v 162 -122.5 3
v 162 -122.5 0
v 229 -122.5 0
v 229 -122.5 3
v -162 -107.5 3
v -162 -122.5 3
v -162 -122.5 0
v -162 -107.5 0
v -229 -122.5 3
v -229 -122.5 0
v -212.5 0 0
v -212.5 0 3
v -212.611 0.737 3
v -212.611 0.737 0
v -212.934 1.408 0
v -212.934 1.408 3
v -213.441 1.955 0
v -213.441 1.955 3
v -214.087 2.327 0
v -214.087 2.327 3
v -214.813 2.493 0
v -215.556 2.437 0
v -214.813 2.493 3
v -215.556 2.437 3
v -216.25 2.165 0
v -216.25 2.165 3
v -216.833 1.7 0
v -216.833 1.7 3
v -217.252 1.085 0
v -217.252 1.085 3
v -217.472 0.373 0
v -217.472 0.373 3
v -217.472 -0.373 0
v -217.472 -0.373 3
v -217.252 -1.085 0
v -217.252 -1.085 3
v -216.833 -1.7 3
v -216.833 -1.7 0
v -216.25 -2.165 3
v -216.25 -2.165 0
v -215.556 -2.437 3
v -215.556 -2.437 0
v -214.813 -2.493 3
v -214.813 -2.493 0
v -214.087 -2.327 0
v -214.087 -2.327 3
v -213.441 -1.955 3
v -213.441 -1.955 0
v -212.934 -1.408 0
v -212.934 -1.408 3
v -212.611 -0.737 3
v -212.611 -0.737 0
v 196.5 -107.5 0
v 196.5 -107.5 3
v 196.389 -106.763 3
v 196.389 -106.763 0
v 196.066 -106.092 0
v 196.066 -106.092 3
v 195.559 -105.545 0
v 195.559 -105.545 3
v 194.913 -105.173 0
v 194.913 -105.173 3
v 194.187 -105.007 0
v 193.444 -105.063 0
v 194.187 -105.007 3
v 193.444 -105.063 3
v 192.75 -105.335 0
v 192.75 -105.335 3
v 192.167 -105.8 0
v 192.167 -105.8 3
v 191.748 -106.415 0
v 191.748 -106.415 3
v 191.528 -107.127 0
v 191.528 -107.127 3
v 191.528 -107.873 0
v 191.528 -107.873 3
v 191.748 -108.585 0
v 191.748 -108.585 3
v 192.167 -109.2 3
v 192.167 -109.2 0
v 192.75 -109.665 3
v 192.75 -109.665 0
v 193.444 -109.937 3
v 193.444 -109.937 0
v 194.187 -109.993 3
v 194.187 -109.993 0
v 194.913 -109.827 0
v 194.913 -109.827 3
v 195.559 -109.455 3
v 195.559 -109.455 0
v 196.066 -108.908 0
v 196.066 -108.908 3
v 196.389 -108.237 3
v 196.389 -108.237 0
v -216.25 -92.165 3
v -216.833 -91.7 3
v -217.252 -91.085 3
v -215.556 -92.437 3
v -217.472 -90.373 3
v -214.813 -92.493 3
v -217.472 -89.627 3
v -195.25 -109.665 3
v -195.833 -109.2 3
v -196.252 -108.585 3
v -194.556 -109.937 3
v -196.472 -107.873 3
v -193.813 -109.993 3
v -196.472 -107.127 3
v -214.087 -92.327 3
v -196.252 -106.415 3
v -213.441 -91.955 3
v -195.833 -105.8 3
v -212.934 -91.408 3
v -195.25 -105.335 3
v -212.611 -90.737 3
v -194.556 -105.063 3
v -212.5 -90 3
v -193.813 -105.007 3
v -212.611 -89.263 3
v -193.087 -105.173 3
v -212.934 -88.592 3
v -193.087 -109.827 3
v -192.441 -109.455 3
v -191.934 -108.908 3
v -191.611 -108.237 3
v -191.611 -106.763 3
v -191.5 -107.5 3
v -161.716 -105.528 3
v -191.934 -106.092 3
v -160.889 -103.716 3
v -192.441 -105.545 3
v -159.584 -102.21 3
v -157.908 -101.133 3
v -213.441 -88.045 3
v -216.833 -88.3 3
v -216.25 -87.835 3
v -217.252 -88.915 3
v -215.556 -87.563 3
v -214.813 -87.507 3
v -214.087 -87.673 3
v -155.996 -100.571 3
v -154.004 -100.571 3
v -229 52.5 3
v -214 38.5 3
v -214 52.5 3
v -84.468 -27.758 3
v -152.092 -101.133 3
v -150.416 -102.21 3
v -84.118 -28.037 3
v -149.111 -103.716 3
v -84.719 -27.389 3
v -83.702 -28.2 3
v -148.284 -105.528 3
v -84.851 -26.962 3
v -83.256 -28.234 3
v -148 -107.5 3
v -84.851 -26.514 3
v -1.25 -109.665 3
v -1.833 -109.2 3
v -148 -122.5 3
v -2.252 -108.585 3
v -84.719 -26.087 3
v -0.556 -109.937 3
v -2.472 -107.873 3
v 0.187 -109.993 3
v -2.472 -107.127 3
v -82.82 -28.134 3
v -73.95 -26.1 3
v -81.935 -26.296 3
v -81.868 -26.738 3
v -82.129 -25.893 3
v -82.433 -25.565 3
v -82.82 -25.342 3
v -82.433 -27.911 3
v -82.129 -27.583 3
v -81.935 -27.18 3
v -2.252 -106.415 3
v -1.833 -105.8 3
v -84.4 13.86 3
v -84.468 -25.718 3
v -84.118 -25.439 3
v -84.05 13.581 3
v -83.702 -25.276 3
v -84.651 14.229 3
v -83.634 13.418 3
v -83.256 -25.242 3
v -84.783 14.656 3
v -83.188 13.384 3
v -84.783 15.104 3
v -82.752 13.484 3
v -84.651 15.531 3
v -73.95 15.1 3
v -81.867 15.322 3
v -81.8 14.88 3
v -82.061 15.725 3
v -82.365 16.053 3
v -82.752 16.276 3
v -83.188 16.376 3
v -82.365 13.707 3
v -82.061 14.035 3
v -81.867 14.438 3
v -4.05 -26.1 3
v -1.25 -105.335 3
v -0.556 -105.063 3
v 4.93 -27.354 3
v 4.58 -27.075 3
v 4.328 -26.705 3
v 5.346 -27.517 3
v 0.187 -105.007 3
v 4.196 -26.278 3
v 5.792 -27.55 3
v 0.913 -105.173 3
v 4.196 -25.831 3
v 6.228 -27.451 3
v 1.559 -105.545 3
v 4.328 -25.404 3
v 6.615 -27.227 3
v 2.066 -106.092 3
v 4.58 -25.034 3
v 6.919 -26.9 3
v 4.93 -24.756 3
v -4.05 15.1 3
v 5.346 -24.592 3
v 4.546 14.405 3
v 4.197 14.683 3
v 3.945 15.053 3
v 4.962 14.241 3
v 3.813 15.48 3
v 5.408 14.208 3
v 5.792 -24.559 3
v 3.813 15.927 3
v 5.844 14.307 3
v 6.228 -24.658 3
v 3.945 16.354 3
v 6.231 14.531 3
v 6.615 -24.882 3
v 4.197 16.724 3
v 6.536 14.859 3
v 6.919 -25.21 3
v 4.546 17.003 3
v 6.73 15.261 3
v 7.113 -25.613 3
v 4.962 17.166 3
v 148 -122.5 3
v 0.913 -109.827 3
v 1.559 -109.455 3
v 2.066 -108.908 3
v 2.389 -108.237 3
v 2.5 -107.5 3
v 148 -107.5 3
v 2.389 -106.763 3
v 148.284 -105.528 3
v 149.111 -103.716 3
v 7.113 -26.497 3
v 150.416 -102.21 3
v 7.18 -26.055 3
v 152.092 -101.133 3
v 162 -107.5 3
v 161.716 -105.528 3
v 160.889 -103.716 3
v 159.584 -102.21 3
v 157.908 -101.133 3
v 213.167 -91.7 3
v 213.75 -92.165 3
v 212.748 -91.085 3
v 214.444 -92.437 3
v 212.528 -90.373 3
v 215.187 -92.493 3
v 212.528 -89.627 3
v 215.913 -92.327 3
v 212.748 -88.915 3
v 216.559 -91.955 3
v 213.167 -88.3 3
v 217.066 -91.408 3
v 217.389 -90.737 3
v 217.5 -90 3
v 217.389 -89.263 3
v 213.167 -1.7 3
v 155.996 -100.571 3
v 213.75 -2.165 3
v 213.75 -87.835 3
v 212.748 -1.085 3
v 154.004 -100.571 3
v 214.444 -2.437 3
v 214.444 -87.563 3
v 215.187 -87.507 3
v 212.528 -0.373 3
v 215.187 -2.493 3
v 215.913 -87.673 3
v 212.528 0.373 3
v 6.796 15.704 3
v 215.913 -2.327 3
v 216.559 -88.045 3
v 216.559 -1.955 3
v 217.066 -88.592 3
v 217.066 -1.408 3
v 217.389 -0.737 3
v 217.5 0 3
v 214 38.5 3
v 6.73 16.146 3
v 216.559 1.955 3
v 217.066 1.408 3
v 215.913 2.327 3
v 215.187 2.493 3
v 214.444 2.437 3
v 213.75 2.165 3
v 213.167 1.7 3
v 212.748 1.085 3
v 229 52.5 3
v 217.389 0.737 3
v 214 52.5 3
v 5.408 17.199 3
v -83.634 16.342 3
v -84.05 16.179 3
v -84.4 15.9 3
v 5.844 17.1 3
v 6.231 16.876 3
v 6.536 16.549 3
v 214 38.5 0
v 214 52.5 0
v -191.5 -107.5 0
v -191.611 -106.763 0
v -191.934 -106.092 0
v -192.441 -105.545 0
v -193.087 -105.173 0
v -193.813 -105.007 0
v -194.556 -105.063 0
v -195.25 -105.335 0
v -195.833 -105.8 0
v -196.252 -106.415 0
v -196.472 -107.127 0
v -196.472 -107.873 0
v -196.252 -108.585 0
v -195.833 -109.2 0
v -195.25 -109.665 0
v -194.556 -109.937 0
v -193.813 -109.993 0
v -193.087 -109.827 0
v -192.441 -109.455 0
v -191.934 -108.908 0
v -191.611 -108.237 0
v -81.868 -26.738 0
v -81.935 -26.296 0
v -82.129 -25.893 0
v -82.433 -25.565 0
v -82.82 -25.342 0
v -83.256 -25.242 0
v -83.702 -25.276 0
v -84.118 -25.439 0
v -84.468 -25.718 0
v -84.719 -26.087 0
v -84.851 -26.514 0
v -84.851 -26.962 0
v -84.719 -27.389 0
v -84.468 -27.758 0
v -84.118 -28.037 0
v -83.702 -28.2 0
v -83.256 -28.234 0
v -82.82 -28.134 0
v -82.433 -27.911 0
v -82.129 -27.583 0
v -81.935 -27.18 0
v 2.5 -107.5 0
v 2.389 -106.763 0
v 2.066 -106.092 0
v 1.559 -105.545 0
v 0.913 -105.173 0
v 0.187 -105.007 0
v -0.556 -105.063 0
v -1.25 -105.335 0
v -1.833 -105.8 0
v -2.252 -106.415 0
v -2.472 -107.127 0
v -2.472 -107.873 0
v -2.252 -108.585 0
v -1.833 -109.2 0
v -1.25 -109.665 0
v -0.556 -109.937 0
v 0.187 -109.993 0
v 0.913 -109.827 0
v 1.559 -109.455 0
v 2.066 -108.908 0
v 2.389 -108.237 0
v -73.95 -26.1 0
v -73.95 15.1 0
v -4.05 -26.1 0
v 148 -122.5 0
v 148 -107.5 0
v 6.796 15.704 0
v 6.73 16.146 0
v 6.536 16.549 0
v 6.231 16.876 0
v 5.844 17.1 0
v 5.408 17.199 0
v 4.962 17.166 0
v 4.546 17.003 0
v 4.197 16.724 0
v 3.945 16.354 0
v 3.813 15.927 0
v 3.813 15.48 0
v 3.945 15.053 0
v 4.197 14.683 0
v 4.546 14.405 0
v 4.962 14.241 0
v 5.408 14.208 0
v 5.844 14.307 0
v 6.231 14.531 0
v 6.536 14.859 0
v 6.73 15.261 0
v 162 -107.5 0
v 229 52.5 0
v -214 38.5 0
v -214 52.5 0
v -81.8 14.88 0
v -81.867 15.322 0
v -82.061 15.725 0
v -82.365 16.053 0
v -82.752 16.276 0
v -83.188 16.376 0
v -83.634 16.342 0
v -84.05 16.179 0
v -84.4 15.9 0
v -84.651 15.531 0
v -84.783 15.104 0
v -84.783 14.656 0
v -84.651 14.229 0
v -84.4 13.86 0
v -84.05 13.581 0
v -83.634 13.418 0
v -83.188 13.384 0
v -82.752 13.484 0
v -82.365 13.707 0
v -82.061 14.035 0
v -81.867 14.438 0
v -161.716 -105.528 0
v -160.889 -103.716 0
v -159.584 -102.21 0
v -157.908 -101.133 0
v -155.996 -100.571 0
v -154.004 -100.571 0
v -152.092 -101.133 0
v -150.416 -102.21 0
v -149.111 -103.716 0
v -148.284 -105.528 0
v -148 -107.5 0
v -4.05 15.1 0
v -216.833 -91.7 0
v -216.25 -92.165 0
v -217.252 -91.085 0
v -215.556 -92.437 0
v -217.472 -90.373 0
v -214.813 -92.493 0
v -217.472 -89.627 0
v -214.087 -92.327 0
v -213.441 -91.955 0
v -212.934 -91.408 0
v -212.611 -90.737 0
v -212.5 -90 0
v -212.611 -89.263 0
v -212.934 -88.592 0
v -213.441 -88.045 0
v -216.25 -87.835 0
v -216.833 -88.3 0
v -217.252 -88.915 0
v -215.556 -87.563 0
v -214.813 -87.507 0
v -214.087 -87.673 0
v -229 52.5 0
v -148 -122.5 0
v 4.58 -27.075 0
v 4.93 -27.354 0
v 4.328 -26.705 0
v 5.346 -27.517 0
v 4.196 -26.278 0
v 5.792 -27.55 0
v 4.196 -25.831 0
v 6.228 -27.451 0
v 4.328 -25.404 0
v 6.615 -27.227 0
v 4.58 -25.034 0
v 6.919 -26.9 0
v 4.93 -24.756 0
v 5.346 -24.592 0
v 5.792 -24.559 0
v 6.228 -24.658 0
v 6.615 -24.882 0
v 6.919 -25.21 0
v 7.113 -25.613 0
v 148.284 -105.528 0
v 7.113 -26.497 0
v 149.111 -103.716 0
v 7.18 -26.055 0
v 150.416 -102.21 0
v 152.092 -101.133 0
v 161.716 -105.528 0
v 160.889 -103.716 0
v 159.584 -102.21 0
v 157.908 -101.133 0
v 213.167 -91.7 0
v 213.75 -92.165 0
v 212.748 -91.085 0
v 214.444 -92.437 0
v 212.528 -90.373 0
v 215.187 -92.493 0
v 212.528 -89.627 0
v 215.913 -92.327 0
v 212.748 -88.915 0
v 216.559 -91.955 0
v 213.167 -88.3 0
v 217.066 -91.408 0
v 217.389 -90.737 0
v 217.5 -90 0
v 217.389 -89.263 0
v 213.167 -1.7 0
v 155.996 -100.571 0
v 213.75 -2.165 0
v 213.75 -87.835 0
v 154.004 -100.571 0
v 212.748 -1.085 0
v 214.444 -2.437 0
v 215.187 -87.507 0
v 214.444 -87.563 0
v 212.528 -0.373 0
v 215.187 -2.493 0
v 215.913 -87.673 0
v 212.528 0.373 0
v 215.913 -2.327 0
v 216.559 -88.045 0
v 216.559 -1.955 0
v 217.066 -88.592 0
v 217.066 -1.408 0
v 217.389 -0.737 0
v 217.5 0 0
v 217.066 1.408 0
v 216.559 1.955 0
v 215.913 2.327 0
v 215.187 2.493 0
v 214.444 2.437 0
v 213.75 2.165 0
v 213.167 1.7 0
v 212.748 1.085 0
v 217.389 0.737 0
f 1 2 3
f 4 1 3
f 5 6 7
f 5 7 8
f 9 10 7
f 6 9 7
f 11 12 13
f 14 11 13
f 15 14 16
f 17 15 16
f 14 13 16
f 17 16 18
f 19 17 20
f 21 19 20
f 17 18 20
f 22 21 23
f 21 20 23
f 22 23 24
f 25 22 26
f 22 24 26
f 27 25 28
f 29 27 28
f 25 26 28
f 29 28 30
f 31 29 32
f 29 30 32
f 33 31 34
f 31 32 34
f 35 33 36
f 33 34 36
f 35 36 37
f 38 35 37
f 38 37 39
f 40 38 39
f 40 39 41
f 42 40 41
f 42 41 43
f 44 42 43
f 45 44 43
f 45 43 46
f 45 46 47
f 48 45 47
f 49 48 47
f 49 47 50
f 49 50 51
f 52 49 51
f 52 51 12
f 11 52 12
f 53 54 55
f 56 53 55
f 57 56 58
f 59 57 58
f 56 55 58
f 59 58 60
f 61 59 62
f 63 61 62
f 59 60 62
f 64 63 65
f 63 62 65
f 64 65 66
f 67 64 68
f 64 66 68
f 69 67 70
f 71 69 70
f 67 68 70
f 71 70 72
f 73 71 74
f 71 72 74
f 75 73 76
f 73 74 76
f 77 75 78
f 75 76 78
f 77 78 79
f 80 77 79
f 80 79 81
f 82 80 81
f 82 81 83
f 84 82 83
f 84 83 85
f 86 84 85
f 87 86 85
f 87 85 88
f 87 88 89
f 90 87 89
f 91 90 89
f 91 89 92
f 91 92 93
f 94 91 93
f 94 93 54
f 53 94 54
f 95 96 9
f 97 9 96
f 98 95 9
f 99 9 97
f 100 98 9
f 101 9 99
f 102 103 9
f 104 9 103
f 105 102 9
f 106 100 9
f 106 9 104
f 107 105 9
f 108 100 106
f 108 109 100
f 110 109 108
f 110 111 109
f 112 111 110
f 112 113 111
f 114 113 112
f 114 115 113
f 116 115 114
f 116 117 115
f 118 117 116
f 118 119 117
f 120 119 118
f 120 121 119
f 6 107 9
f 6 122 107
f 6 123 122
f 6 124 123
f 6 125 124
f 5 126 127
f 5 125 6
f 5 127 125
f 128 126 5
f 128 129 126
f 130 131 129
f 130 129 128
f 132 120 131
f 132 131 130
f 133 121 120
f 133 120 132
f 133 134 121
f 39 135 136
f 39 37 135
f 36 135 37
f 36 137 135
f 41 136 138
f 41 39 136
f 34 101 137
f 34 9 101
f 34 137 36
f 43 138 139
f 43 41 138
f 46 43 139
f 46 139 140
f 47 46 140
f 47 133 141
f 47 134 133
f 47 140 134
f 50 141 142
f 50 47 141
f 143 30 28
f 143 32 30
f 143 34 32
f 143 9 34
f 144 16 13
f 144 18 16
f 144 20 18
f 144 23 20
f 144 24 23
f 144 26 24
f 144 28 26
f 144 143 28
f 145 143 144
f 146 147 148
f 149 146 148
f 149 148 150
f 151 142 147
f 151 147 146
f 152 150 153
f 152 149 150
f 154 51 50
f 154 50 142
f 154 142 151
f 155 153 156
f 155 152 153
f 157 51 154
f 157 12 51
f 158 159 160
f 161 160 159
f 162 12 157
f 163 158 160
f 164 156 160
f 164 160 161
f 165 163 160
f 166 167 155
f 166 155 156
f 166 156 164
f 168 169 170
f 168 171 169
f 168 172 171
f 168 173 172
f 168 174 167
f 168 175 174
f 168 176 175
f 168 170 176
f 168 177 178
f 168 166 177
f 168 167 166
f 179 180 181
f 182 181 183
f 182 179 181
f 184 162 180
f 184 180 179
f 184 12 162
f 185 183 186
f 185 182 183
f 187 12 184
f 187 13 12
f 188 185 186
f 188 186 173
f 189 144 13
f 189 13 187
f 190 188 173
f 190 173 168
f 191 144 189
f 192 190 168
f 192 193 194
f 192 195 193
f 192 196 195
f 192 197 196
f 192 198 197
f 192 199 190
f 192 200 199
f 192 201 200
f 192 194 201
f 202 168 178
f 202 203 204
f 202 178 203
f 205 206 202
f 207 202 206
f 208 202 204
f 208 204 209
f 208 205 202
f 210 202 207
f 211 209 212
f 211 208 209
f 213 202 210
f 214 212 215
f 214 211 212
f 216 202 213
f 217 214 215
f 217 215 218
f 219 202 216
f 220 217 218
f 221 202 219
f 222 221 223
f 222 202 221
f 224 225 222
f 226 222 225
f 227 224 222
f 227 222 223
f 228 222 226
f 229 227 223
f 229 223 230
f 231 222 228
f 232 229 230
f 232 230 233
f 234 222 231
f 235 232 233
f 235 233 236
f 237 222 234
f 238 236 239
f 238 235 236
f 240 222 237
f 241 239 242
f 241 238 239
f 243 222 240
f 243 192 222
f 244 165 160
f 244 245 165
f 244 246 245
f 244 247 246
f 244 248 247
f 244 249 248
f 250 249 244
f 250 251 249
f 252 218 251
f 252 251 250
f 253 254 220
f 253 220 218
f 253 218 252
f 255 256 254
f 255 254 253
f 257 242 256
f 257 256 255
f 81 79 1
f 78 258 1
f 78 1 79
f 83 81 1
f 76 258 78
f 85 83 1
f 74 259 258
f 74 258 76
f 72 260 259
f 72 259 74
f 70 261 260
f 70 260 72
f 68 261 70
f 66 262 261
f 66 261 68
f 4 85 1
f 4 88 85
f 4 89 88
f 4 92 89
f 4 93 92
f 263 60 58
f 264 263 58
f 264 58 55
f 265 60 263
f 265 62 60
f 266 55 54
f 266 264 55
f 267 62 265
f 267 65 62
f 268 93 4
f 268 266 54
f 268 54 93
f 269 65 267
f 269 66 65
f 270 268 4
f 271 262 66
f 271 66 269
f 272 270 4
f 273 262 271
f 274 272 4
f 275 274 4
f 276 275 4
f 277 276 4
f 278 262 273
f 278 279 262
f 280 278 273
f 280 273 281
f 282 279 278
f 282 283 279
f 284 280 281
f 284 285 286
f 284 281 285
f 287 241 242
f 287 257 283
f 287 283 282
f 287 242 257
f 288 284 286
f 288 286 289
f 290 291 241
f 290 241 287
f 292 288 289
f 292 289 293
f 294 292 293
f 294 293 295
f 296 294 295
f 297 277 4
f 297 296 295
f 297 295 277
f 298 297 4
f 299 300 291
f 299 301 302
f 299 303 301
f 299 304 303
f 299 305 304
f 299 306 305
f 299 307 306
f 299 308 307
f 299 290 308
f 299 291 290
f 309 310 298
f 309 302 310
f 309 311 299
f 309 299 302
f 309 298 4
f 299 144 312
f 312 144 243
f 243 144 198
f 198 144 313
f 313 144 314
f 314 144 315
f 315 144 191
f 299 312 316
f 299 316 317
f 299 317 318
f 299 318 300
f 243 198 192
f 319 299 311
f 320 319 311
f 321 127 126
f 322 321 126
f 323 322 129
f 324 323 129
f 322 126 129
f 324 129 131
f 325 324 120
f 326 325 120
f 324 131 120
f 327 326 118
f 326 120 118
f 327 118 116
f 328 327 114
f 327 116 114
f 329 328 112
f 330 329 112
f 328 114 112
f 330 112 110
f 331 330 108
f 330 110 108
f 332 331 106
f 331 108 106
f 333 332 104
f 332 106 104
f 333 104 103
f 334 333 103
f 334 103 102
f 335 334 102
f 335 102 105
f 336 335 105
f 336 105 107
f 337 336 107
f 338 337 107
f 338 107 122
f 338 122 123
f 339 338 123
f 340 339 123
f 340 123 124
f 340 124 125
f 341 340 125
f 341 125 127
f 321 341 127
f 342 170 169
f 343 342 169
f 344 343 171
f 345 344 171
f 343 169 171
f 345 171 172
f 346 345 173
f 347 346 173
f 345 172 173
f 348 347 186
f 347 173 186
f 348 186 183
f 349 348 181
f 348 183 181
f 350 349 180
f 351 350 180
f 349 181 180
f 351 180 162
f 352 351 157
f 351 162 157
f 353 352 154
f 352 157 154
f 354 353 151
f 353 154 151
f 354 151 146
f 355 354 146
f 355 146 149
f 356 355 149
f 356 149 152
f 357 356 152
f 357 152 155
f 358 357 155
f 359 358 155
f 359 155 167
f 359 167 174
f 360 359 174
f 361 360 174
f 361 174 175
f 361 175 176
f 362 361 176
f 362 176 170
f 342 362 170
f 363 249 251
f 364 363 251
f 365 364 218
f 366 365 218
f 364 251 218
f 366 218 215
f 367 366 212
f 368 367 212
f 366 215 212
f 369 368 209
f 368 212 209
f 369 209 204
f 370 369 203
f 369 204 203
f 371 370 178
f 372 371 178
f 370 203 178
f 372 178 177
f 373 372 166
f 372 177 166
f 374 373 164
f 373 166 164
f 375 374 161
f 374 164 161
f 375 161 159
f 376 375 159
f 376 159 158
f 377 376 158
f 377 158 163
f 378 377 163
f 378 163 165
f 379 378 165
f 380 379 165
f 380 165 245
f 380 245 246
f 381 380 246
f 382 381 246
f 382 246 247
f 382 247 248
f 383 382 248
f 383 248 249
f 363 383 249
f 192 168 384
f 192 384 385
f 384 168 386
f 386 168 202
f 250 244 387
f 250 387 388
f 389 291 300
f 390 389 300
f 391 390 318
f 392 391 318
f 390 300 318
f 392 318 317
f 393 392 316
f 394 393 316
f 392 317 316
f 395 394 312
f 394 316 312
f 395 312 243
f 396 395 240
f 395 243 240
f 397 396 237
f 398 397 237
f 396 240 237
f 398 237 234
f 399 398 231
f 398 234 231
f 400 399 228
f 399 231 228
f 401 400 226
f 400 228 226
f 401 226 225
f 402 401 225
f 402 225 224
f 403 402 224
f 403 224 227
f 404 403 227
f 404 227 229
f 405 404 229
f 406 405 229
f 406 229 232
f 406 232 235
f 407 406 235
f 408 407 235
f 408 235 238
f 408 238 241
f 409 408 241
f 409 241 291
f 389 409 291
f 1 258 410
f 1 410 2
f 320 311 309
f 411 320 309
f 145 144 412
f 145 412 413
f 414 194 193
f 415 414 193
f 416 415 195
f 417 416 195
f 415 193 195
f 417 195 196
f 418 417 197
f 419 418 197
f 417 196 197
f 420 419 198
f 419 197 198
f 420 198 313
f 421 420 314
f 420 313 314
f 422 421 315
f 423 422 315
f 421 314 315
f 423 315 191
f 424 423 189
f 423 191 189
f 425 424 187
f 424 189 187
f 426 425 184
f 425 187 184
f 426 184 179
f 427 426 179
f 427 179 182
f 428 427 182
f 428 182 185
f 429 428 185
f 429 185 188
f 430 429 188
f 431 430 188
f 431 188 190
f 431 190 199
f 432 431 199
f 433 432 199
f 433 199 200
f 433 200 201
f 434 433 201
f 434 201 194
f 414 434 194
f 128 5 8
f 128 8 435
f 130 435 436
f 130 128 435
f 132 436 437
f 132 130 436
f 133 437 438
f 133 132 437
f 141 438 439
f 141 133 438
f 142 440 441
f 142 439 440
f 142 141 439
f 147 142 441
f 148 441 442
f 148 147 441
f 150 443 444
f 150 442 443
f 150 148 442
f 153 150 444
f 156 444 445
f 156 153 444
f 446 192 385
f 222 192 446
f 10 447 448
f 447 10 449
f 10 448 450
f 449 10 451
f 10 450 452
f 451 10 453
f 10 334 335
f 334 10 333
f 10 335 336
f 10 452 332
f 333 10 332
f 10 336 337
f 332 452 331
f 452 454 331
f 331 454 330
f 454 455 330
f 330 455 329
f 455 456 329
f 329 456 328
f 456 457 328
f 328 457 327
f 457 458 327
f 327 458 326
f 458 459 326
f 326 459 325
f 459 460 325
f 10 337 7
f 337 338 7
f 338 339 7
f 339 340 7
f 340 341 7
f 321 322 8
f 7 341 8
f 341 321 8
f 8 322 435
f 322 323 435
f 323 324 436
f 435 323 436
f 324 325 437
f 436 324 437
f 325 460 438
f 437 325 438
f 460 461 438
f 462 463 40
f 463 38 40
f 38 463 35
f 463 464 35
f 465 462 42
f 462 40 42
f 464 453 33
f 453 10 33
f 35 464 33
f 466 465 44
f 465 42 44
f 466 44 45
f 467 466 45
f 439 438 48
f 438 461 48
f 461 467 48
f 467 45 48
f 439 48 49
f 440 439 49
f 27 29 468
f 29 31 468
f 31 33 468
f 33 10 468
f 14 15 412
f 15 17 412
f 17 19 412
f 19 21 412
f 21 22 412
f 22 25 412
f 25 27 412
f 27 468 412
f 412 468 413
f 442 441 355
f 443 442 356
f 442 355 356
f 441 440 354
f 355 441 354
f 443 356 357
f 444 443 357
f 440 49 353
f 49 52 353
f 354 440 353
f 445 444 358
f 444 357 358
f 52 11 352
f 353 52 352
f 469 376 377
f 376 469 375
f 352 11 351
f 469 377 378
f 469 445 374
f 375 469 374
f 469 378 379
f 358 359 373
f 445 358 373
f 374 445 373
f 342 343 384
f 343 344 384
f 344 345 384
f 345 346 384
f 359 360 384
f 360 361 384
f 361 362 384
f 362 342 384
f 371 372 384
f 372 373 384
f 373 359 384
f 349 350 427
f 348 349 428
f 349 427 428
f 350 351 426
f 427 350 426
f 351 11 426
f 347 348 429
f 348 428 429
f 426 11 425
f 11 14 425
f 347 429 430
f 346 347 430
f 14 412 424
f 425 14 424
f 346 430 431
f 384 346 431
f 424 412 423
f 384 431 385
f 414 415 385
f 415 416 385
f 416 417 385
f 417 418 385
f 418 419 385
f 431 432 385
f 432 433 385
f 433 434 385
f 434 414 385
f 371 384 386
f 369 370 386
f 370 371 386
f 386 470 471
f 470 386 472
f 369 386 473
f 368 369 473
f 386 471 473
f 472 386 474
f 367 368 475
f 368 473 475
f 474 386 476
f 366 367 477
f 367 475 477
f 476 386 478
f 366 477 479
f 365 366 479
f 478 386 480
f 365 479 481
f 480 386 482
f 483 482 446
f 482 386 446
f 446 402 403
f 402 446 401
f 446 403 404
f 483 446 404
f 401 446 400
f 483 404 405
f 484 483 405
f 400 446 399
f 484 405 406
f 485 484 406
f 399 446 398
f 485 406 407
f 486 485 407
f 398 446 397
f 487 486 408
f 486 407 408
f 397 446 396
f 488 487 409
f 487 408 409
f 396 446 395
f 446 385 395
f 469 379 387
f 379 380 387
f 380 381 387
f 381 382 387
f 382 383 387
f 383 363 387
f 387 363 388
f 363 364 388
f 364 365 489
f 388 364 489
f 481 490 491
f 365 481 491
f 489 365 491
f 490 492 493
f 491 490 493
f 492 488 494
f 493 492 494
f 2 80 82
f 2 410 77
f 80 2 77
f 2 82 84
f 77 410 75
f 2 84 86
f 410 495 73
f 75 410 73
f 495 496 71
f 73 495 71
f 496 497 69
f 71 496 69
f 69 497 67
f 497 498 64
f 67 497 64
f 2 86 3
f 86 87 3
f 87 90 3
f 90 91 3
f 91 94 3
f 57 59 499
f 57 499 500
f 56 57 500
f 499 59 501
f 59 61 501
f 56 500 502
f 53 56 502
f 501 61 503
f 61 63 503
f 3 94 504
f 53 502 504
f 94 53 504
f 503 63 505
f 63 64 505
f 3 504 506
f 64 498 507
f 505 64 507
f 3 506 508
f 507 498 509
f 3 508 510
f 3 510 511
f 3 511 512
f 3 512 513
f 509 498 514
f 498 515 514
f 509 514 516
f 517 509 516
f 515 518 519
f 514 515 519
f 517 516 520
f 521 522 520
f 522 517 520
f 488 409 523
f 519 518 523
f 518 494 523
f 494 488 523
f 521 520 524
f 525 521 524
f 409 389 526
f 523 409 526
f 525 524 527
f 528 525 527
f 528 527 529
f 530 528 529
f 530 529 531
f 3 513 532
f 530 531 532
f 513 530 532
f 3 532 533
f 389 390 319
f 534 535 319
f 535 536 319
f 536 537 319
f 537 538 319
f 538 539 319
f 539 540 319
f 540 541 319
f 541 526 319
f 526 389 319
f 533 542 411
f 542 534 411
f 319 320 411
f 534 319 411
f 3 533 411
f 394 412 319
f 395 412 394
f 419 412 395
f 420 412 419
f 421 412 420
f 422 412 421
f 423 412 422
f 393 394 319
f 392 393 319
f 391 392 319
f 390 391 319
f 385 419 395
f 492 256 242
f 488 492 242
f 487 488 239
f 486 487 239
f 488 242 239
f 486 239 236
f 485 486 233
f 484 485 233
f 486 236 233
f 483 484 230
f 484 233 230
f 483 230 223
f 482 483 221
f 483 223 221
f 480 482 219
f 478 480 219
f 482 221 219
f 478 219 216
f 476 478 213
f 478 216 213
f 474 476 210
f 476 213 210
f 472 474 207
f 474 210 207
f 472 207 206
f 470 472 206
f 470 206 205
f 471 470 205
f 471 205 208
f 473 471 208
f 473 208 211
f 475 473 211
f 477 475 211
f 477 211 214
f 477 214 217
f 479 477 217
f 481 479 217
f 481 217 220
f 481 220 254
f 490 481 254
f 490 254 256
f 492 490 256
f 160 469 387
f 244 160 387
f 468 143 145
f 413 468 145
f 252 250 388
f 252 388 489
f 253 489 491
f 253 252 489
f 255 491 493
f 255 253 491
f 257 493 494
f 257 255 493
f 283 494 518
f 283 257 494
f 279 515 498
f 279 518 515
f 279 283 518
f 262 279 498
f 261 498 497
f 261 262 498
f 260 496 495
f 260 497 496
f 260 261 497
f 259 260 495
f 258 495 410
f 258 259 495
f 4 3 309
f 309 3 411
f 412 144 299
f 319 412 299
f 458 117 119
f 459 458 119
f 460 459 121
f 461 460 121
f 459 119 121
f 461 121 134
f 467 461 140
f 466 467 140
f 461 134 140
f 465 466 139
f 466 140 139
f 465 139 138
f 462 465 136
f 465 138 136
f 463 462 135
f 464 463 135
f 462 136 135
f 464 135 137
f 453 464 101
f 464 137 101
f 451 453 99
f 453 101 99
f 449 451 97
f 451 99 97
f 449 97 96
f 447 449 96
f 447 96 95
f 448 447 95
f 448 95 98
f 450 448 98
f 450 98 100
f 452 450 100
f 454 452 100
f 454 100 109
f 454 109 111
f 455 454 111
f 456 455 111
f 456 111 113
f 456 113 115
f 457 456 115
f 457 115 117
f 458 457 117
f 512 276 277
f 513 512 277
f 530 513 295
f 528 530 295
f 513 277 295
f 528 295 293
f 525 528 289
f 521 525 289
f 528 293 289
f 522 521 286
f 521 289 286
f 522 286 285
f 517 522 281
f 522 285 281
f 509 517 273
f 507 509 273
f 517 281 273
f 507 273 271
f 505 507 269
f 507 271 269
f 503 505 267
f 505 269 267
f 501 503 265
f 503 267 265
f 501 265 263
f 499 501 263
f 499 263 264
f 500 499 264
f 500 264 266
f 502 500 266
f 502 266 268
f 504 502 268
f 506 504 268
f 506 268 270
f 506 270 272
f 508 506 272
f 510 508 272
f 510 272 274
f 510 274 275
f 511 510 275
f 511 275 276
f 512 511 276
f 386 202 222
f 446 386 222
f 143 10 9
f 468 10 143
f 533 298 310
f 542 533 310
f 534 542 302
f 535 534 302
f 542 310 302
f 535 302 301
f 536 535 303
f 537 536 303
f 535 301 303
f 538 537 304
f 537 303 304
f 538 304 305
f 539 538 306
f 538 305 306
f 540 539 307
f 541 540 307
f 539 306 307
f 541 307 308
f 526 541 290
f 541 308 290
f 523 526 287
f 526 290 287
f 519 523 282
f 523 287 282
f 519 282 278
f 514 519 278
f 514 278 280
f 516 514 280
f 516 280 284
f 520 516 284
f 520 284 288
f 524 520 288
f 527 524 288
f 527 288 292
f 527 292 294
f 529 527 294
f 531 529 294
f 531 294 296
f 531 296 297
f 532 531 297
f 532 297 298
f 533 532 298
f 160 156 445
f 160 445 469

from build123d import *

# Parameters (mm, degrees)
SKETCH1_W           = 458
SKETCH1_H           = 245
BOSS_EXTRUDE1_DEPTH = 3
CUT_EXTRUDE1_DEPTH  = 260.723410574
SKETCH3_R           = 2.5
CUT_EXTRUDE2_DEPTH  = 260.723410574
SKETCH4_R           = 11.5
CUT_EXTRUDE3_DEPTH  = 260.723410574
SKETCH5_W           = 428
SKETCH5_H           = 29
CUT_EXTRUDE4_DEPTH  = 260.723410574
SKETCH8_R           = 1.5
SKETCH8_W           = 69.9
SKETCH8_H           = 41.2
CUT_EXTRUDE5_DEPTH  = 260.723410574
SKETCH9_W           = 458
SKETCH9_H           = 70
CUT_EXTRUDE6_DEPTH  = 10


with BuildPart() as part:
    # Sketch1 → Boss-Extrude1 (new body)
    with BuildSketch(Plane.XY):
        Rectangle(SKETCH1_W, SKETCH1_H)
    extrude(amount=BOSS_EXTRUDE1_DEPTH)

    # Sketch2 → Cut-Extrude1 (cut, through all)
    with BuildSketch(Plane.XY.offset(3)):
        with BuildLine():
            Line((-148, -107.5), (-148, -122.5))
            ThreePointArc((-148, -122.5), (-155, -129.5), (-162, -122.5))
            Line((-162, -122.5), (-162, -107.5))
            ThreePointArc((-162, -107.5), (-155, -100.5), (-148, -107.5))
        make_face()
        with BuildLine():
            Line((162, -107.5), (162, -122.5))
            ThreePointArc((162, -122.5), (155, -129.5), (148, -122.5))
            Line((148, -122.5), (148, -107.5))
            ThreePointArc((148, -107.5), (155, -100.5), (162, -107.5))
        make_face()
    extrude(amount=-CUT_EXTRUDE1_DEPTH, mode=Mode.SUBTRACT)

    # Sketch3 → Cut-Extrude2 (cut, through all)
    with BuildSketch(Plane.XY.offset(3)):
        with Locations((-194, 112.5)):
            Circle(SKETCH3_R)
        with Locations((-194, -107.5)):
            Circle(SKETCH3_R)
        with Locations((194, -107.5)):
            Circle(SKETCH3_R)
        with Locations((194, 112.5)):
            Circle(SKETCH3_R)
        with Locations((-215, 0)):
            Circle(SKETCH3_R)
        with Locations((-215, -90)):
            Circle(SKETCH3_R)
        with Locations((-215, 90)):
            Circle(SKETCH3_R)
        with Locations((215, 0)):
            Circle(SKETCH3_R)
        with Locations((215, -90)):
            Circle(SKETCH3_R)
        with Locations((215, 90)):
            Circle(SKETCH3_R)
        with Locations((0, 112.5)):
            Circle(SKETCH3_R)
        with Locations((0, -107.5)):
            Circle(SKETCH3_R)
    extrude(amount=-CUT_EXTRUDE2_DEPTH, mode=Mode.SUBTRACT)

    # Sketch4 → Cut-Extrude3 (cut, through all)
    with BuildSketch(Plane.XY.offset(3)):
        with Locations((-39, 91)):
            Circle(SKETCH4_R)
        with Locations((39, 91)):
            Circle(SKETCH4_R)
    extrude(amount=-CUT_EXTRUDE3_DEPTH, mode=Mode.SUBTRACT)

    # Sketch5 → Cut-Extrude4 (cut, through all)
    with BuildSketch(Plane.XY.offset(3)):
        with Locations((0, 53)):
            Rectangle(SKETCH5_W, SKETCH5_H)
    extrude(amount=-CUT_EXTRUDE4_DEPTH, mode=Mode.SUBTRACT)

    # Sketch8 → Cut-Extrude5 (cut, through all)
    with BuildSketch(Plane.XY.offset(3)):
        with Locations((5.296172264, 15.703565509)):
            Circle(SKETCH8_R)
        with Locations((5.679687501, -26.054673392)):
            Circle(SKETCH8_R)
        with Locations((-83.3, 14.88)):
            Circle(SKETCH8_R)
        with Locations((-83.367997673, -26.737946691)):
            Circle(SKETCH8_R)
        with Locations((-39, -5.5)):
            Rectangle(SKETCH8_W, SKETCH8_H)
    extrude(amount=-CUT_EXTRUDE5_DEPTH, mode=Mode.SUBTRACT)

    # Sketch9 → Cut-Extrude6 (cut)
    with BuildSketch(Plane.XY.offset(3)):
        with Locations((0, 87.5)):
            Rectangle(SKETCH9_W, SKETCH9_H)
    extrude(amount=-CUT_EXTRUDE6_DEPTH, mode=Mode.SUBTRACT)


solid = part.part
